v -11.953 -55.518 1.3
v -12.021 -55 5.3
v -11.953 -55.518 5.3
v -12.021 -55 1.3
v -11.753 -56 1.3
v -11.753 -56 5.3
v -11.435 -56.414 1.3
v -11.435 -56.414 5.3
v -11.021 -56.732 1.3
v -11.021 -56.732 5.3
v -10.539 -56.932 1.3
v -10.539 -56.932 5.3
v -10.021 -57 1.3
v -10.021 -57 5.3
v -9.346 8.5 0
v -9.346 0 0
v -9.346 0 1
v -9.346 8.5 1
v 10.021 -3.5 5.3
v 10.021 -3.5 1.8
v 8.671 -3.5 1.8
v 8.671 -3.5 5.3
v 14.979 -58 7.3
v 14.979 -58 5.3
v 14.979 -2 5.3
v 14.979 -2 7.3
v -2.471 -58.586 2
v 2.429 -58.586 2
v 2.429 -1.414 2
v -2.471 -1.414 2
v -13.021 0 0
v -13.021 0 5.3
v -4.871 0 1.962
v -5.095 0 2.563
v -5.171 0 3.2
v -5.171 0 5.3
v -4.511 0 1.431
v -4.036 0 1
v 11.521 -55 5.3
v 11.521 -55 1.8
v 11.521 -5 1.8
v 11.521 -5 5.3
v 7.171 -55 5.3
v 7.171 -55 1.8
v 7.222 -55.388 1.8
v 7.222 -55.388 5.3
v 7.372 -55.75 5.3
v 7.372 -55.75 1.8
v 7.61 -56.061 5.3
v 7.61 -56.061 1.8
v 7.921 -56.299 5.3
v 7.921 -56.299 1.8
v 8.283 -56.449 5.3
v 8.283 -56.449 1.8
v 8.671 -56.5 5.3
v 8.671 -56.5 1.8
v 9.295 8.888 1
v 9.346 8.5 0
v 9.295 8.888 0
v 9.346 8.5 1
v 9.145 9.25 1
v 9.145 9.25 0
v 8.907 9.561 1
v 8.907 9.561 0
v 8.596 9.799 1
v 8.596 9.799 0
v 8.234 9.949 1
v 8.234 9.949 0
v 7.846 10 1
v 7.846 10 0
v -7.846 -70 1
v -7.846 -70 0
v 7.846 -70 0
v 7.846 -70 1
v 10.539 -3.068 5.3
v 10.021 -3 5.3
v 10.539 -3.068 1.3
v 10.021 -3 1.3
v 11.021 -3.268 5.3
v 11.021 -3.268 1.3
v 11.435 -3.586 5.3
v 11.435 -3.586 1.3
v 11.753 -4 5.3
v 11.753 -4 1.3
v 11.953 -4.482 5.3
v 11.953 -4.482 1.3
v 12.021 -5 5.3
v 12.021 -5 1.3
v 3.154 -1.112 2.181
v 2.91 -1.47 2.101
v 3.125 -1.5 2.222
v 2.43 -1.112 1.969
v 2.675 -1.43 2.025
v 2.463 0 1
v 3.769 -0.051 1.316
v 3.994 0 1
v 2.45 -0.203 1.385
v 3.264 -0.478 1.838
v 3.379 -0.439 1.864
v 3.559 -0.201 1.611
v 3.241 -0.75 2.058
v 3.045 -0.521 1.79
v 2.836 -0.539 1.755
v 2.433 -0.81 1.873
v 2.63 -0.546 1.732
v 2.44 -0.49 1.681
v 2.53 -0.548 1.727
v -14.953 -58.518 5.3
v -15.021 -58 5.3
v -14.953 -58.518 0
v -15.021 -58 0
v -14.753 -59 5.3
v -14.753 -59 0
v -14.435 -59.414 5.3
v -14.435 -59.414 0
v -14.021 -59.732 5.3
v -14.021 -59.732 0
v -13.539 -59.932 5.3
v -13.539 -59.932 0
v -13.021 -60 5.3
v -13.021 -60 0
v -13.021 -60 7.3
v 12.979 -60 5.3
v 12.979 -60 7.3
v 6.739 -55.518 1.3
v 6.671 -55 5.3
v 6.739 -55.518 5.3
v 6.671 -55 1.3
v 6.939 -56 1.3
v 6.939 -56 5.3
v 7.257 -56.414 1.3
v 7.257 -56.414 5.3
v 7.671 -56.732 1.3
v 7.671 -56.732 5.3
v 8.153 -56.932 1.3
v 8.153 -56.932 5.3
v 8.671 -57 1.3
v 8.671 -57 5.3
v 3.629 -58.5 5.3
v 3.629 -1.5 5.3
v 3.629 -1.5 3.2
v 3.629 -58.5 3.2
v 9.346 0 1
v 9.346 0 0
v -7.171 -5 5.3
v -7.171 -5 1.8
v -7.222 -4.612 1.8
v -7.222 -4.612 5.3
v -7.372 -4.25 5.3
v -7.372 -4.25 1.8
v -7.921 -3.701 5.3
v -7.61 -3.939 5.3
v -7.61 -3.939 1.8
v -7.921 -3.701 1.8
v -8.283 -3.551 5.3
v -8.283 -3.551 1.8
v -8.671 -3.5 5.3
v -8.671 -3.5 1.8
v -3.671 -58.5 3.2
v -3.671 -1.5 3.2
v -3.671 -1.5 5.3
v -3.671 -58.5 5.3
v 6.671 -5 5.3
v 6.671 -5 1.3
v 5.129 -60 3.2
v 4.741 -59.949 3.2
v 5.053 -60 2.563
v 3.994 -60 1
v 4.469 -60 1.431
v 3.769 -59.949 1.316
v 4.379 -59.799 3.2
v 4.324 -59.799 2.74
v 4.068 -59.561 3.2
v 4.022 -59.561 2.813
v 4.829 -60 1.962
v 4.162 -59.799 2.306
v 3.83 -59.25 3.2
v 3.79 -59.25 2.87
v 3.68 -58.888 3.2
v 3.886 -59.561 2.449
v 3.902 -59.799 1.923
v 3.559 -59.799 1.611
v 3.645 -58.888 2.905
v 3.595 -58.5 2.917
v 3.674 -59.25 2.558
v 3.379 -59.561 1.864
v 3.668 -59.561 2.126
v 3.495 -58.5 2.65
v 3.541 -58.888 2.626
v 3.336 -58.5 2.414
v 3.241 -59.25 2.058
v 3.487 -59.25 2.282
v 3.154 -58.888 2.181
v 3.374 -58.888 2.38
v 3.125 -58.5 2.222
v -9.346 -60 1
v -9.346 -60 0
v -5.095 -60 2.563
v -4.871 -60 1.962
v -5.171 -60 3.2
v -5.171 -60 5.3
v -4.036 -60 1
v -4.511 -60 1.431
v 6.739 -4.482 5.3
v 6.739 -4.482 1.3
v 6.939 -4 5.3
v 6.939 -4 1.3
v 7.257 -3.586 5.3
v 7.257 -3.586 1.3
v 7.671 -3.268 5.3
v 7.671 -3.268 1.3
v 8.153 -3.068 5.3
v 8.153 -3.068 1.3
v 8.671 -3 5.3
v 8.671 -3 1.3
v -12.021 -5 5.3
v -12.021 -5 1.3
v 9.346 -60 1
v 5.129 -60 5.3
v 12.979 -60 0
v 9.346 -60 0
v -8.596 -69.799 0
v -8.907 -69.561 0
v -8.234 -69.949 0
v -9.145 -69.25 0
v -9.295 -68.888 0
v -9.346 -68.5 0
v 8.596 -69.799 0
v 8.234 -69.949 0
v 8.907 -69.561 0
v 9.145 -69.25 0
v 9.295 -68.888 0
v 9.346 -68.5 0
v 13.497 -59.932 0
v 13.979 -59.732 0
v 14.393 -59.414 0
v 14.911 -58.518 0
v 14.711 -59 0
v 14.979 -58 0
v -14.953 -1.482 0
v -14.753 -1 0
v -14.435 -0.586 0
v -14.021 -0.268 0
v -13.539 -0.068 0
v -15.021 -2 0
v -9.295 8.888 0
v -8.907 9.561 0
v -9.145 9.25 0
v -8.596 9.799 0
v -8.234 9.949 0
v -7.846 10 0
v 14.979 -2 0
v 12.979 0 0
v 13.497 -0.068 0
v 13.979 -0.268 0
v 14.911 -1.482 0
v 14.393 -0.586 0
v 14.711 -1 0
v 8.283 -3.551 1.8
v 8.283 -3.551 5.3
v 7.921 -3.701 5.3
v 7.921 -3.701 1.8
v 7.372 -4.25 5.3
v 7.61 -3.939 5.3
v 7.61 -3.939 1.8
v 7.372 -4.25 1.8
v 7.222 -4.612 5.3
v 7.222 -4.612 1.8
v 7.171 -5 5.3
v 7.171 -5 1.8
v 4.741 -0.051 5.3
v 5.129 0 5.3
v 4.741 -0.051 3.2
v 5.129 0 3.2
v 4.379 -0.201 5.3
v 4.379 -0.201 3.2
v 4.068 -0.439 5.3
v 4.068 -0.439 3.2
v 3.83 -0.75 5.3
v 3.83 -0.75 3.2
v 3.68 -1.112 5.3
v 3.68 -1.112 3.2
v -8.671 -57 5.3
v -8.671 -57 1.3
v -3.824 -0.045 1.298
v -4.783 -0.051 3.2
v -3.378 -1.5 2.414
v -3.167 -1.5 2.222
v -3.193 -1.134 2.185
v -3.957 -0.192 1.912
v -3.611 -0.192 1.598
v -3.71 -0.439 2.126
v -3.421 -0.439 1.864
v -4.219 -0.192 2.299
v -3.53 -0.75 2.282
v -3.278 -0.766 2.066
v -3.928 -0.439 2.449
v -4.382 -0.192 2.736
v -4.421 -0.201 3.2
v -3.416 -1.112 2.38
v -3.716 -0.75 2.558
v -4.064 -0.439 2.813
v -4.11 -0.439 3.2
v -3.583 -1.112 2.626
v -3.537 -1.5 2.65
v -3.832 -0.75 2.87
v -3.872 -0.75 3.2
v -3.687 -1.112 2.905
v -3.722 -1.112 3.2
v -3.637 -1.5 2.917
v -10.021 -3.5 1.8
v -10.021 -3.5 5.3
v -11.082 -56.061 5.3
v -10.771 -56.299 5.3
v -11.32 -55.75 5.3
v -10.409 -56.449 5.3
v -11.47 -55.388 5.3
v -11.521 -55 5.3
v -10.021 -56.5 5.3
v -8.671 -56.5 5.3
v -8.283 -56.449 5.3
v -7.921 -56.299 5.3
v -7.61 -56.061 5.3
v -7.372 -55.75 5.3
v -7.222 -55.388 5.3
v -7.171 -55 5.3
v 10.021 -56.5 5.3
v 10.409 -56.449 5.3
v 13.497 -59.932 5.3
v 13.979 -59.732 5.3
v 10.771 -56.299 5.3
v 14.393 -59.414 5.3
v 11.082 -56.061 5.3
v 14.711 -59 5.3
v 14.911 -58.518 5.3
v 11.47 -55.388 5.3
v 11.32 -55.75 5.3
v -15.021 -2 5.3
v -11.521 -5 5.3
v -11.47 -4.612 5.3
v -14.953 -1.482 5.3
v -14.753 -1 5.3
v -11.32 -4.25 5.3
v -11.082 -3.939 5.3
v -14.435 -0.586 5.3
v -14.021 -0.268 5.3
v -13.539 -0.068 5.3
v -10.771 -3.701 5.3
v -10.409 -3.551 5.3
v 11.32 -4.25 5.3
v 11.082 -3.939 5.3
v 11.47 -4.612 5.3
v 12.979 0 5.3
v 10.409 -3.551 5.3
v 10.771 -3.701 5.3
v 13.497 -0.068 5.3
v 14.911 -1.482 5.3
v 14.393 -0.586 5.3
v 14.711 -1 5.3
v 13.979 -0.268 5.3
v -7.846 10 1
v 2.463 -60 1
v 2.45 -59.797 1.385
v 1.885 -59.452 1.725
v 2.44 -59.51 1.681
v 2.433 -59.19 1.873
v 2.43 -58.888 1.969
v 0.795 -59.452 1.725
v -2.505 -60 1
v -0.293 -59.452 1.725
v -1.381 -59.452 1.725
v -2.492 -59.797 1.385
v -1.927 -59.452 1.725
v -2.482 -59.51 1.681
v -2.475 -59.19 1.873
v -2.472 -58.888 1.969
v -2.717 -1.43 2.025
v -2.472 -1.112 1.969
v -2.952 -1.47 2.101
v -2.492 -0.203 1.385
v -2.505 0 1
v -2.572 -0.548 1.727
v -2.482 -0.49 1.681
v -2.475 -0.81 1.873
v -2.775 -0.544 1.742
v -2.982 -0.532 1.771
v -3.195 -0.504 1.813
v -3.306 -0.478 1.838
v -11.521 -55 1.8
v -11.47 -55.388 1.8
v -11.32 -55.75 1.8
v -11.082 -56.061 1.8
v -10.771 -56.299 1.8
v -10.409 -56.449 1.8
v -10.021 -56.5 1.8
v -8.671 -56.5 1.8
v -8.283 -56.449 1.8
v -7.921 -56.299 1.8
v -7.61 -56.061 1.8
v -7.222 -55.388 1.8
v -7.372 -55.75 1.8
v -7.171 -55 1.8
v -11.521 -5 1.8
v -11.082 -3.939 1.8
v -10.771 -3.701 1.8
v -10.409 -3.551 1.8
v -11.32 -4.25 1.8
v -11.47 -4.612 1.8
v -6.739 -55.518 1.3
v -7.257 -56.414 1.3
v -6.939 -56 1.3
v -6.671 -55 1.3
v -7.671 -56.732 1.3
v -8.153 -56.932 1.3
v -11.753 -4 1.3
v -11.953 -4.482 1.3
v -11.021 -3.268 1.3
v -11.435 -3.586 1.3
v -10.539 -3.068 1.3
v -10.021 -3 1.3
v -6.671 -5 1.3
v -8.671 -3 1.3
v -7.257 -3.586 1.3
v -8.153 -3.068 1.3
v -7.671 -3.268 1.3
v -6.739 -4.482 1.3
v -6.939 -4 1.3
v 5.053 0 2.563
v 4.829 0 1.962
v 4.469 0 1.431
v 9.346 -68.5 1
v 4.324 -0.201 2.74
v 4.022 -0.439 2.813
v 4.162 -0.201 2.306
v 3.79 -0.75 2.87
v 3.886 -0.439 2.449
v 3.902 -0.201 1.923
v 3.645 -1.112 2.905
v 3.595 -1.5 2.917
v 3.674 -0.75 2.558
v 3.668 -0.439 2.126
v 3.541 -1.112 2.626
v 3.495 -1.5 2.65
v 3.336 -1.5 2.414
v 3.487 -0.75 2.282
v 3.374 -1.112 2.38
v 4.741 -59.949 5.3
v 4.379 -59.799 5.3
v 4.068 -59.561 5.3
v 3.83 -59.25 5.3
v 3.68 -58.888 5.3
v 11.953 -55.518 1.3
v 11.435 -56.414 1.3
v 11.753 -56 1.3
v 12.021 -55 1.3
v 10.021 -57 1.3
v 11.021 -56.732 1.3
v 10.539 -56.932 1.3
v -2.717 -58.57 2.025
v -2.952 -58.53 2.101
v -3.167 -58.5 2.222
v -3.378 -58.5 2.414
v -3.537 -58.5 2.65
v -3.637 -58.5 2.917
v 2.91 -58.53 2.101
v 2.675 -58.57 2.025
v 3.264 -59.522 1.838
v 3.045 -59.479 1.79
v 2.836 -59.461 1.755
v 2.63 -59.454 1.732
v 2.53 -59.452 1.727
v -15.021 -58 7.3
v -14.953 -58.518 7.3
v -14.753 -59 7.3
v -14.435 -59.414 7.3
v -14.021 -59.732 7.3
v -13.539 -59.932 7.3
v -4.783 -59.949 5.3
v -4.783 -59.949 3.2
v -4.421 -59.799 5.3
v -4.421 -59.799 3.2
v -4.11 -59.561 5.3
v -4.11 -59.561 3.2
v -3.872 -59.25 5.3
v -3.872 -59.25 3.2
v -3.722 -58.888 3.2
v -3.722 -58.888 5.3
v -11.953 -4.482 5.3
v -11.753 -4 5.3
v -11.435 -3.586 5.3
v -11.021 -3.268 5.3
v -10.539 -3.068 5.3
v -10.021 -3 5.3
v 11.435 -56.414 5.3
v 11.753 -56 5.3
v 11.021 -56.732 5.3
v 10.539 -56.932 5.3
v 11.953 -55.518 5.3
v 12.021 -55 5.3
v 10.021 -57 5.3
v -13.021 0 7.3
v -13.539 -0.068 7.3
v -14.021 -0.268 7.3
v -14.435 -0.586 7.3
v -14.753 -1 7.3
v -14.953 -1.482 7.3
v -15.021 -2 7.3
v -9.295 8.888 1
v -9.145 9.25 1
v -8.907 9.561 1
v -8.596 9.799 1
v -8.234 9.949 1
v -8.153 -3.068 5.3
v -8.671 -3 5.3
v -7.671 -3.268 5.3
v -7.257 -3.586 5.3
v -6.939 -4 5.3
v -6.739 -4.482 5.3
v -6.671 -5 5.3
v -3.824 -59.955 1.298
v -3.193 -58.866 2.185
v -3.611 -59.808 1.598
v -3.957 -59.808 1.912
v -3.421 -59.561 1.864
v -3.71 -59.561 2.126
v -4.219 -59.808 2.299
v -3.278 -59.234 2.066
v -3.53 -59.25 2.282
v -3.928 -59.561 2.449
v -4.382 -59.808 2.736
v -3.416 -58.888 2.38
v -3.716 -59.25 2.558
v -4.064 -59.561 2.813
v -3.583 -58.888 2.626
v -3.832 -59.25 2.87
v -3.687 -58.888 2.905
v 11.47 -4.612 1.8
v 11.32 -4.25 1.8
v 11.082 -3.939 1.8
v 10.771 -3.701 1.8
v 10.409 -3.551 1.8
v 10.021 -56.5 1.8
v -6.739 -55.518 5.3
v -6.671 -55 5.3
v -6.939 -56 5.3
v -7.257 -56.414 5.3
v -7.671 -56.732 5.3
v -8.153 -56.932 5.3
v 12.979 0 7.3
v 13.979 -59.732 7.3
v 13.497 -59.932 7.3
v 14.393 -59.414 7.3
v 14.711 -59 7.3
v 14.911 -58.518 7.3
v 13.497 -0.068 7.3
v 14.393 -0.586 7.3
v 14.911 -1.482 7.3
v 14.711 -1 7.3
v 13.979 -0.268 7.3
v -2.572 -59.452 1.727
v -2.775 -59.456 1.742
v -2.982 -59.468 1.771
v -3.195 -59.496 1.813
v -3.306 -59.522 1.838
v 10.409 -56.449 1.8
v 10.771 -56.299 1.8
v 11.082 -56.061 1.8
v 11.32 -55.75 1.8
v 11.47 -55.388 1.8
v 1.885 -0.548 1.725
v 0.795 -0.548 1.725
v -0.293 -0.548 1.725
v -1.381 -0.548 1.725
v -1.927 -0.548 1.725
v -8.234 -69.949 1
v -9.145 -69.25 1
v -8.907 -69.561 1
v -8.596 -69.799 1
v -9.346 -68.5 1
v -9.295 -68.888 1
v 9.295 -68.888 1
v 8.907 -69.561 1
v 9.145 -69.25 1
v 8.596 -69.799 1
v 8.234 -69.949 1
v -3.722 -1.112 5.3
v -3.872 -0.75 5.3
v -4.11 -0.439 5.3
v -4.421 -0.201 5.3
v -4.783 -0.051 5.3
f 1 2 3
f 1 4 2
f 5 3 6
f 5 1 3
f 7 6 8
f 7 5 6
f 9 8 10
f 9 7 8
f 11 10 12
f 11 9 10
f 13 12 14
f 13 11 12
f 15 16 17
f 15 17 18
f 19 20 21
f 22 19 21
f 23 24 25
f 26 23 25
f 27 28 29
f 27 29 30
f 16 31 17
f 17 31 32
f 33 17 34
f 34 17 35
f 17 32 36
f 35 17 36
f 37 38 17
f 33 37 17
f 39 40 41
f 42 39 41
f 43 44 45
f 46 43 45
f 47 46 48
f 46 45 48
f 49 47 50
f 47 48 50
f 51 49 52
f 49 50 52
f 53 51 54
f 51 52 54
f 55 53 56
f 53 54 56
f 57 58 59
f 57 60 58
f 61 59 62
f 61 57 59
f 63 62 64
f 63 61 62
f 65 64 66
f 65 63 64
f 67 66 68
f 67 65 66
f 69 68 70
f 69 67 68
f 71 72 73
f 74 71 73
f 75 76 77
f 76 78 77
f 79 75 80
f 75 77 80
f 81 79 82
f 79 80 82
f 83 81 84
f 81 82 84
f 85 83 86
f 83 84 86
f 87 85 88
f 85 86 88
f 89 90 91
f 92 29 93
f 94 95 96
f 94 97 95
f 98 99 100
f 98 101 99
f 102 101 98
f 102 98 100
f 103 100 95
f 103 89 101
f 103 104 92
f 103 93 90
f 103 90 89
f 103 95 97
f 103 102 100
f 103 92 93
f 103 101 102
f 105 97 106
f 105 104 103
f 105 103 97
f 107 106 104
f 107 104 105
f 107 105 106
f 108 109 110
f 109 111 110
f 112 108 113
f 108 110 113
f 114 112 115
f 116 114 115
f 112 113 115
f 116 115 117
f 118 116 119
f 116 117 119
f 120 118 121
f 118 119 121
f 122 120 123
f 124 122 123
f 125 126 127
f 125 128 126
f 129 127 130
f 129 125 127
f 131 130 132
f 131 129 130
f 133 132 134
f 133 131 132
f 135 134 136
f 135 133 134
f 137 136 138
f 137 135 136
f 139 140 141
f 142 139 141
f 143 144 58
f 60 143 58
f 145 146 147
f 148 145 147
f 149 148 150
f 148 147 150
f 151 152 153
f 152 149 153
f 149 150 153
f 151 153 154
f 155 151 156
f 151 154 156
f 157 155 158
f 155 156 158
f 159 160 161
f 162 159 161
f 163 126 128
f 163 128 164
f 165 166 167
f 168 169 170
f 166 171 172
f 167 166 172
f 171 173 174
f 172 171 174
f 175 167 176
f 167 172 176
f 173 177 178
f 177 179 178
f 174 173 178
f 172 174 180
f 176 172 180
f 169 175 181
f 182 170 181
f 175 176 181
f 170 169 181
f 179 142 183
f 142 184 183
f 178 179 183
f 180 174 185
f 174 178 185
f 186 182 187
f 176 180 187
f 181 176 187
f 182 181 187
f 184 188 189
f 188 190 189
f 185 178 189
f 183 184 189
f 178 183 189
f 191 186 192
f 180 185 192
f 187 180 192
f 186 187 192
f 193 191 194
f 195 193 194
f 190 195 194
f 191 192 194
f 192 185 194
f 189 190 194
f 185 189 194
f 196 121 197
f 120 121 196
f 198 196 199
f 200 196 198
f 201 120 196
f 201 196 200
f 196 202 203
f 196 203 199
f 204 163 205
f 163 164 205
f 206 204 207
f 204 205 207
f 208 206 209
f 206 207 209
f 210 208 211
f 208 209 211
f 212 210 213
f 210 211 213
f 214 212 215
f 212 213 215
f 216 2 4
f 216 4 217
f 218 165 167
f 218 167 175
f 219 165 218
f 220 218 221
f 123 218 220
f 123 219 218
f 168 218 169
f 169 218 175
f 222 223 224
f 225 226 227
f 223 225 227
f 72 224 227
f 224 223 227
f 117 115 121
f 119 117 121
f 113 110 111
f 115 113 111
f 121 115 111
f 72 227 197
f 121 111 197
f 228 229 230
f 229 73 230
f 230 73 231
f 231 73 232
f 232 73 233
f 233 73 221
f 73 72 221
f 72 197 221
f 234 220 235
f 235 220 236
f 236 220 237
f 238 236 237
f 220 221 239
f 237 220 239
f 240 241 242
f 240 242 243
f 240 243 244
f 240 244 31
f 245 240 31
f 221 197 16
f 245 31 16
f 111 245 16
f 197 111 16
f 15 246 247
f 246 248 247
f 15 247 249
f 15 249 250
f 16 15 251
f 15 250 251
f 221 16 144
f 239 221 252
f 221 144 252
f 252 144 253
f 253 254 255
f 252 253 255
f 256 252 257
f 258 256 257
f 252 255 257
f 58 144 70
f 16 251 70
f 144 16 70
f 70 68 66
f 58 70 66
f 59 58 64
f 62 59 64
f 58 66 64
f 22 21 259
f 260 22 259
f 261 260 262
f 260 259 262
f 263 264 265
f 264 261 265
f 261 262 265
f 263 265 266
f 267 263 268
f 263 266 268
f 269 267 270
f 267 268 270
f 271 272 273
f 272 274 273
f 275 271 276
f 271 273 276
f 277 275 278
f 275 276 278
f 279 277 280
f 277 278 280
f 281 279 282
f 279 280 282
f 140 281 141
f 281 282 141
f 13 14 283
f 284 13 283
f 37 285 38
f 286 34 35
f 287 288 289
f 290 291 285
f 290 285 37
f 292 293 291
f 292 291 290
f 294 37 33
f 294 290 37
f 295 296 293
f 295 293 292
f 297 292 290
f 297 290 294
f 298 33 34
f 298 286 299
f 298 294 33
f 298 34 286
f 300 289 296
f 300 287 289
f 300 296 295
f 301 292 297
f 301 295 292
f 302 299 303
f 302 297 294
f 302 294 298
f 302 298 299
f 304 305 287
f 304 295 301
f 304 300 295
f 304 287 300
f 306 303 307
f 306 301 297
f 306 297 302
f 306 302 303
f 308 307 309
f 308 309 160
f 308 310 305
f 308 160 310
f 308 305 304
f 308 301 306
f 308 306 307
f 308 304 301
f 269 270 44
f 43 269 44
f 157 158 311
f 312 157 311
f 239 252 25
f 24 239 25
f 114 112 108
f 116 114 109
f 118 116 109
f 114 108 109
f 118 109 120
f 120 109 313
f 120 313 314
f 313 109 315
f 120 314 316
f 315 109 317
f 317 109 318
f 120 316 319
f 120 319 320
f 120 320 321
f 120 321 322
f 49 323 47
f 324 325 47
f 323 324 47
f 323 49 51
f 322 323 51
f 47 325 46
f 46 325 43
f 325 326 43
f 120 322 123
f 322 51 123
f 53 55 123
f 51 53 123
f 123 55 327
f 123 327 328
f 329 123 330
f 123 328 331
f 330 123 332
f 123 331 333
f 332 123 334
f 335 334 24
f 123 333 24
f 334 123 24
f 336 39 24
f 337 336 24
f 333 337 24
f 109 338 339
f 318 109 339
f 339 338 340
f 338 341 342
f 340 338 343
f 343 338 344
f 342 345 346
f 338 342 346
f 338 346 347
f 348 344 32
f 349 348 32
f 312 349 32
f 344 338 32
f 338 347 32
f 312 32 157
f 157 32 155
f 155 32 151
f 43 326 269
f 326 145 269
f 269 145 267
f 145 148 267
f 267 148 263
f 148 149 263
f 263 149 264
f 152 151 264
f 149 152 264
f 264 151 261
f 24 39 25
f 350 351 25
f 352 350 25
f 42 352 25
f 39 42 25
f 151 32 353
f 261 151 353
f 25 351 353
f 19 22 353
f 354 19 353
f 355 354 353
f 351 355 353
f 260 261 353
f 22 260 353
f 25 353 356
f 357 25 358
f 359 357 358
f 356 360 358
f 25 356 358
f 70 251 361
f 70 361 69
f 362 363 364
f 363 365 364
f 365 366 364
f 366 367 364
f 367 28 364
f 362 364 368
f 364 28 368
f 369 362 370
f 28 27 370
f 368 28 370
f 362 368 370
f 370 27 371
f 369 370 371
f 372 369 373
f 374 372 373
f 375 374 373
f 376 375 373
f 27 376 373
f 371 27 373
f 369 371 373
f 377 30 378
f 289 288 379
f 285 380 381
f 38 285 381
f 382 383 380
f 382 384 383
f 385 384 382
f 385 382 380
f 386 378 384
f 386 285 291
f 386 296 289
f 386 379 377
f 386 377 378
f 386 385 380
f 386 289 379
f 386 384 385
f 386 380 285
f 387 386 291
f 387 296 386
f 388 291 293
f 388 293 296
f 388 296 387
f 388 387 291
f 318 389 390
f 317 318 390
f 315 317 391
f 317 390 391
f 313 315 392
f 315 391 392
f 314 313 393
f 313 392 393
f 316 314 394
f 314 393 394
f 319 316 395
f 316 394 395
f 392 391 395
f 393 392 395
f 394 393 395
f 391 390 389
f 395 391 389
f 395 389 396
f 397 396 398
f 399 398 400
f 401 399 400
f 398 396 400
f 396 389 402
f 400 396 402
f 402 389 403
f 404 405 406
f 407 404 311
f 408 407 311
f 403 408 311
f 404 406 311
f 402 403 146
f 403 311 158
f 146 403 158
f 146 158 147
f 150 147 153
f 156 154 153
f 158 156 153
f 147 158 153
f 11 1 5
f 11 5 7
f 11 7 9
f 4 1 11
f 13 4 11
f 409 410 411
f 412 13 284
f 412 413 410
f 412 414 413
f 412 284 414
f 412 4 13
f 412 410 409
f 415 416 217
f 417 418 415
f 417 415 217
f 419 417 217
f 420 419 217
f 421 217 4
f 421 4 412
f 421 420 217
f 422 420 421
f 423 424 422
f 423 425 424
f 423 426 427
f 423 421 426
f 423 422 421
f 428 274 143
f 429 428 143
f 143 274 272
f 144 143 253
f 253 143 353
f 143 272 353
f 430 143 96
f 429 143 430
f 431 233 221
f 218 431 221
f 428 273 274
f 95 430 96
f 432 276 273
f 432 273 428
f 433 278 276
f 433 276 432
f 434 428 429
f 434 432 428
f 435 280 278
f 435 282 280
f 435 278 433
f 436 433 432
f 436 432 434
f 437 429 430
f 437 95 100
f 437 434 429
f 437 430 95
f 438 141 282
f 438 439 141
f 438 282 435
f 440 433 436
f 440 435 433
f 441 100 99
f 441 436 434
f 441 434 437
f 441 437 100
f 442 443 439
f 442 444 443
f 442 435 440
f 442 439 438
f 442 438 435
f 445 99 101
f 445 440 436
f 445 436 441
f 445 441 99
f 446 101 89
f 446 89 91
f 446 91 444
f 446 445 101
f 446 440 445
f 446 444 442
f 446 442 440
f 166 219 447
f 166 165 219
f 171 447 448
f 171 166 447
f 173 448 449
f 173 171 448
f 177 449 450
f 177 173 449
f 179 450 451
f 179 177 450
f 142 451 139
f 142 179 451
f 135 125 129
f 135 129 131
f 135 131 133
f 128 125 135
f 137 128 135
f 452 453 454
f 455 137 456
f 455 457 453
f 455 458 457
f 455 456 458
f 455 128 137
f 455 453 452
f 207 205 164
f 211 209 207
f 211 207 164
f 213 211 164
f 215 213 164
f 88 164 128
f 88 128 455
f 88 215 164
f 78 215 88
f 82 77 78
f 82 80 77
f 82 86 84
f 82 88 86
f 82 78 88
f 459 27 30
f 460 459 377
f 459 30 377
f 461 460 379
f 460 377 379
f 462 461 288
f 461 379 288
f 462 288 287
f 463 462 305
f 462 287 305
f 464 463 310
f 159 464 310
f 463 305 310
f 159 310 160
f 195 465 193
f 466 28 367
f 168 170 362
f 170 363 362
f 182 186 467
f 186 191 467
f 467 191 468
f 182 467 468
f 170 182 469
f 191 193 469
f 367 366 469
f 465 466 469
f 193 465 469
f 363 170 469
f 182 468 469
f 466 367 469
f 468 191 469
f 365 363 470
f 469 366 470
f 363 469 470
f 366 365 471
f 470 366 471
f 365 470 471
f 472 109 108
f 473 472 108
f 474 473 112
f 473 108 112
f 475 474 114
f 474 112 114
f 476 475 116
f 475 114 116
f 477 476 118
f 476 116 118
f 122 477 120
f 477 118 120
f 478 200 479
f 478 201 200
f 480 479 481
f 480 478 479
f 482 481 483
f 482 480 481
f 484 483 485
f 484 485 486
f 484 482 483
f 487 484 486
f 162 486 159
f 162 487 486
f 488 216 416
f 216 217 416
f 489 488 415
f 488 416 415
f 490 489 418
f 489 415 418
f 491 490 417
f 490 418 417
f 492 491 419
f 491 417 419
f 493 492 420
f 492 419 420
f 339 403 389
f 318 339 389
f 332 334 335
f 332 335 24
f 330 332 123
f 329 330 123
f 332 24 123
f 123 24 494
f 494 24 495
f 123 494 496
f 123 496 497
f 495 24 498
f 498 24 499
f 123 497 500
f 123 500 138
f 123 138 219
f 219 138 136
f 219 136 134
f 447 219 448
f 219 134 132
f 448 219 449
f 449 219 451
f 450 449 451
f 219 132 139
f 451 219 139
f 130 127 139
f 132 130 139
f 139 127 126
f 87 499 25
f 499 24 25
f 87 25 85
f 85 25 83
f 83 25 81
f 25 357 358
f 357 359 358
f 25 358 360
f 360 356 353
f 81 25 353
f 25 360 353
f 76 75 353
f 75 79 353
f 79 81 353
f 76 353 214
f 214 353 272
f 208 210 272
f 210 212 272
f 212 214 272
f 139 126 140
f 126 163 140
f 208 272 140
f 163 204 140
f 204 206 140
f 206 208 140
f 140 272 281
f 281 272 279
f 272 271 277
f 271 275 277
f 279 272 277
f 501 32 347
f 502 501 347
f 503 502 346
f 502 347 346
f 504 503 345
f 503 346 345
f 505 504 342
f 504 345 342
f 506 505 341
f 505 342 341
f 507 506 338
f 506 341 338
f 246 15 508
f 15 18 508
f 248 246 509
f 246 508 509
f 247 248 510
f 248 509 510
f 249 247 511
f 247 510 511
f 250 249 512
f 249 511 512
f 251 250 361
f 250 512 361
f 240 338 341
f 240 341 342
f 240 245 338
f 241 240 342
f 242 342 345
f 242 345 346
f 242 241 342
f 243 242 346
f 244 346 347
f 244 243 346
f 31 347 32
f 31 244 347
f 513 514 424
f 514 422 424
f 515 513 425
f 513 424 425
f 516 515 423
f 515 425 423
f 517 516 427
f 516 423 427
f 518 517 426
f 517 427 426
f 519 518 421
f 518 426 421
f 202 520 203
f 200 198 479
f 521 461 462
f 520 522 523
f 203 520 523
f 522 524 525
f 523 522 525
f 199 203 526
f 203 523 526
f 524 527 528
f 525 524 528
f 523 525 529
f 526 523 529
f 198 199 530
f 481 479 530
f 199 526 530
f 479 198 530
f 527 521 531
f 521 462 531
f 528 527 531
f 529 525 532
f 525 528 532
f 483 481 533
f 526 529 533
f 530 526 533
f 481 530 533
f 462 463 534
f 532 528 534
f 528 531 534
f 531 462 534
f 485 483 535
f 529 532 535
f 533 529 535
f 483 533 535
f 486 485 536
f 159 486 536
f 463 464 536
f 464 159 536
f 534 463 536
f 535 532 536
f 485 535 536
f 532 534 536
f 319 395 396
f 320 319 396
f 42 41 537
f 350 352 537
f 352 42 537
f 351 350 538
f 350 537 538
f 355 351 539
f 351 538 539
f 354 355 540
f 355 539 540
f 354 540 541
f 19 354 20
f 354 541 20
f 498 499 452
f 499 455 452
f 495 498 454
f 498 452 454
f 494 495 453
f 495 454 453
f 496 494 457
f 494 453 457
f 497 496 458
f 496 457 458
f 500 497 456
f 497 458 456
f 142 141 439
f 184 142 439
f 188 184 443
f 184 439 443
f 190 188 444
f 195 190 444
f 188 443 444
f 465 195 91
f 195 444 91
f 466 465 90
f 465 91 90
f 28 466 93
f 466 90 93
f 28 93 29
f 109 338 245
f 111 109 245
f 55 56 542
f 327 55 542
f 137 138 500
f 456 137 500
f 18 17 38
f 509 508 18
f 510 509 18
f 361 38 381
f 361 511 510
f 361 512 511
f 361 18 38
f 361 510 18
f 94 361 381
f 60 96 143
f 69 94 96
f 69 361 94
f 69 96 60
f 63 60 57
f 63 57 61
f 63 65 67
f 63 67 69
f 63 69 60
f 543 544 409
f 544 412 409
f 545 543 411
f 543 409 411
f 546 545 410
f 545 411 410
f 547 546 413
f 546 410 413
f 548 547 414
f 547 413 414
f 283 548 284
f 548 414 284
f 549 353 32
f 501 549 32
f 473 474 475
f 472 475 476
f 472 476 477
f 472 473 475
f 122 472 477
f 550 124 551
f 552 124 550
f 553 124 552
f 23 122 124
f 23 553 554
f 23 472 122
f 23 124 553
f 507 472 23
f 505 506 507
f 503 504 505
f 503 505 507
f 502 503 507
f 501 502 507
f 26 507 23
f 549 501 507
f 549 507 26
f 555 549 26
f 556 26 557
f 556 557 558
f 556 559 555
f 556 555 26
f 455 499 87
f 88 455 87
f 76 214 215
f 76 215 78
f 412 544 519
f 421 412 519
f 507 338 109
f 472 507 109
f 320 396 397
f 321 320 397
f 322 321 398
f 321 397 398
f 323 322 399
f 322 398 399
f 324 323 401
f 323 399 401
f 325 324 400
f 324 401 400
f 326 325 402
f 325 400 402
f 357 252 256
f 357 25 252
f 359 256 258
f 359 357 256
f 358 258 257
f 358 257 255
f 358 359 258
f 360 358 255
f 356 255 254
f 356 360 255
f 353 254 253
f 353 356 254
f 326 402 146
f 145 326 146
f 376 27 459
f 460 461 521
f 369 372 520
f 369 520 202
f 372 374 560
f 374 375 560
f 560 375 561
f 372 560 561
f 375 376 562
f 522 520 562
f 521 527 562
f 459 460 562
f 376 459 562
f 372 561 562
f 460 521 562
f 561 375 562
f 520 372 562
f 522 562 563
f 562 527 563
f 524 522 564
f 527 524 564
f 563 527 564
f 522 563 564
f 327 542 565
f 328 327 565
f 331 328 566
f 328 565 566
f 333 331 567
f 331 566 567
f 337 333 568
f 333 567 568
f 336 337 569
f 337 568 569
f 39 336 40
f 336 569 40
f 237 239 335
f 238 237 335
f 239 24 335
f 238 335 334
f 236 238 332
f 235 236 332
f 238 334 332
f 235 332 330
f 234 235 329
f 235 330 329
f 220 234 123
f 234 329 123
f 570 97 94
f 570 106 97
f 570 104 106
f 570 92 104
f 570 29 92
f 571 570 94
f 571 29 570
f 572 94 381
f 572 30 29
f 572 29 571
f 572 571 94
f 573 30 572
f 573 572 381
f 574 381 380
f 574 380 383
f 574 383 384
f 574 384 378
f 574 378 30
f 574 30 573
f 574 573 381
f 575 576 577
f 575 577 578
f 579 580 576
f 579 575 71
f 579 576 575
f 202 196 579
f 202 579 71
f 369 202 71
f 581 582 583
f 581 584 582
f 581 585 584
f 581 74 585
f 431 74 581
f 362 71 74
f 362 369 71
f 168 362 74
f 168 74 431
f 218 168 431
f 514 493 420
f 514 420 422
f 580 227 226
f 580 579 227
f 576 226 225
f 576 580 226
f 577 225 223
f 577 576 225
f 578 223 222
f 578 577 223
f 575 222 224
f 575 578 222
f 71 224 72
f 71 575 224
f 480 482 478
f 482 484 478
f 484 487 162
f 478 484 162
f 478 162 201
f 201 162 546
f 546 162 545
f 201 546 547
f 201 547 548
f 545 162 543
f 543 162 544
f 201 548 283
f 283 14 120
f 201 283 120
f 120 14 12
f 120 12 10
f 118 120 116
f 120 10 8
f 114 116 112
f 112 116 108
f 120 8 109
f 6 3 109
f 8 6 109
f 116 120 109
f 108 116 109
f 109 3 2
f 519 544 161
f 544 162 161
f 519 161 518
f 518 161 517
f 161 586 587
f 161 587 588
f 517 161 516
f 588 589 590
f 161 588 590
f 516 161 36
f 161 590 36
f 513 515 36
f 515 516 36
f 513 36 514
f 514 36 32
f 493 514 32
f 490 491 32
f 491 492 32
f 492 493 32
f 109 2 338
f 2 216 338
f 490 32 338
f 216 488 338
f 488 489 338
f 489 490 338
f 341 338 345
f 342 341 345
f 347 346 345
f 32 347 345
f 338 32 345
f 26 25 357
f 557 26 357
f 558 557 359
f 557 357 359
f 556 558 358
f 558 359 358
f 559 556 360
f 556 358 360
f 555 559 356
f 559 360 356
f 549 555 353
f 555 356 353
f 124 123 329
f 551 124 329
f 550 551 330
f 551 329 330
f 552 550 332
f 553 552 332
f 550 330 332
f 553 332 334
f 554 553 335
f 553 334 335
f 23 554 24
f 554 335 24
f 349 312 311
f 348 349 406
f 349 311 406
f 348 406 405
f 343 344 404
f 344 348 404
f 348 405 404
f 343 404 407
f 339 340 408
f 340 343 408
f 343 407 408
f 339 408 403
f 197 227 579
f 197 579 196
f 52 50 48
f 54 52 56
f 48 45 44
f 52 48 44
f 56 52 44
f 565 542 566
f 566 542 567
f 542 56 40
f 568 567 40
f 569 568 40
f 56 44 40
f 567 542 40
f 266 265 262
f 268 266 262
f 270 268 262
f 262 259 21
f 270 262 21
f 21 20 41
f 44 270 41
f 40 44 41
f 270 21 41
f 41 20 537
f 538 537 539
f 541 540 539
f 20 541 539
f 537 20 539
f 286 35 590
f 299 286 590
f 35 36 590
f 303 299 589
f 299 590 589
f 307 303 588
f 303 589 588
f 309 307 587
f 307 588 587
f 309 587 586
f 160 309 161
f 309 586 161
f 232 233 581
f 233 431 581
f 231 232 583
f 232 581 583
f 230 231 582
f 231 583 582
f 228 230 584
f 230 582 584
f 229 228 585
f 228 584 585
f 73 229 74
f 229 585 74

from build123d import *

# Parameters (mm, degrees)
F1_DEPTH      = 60
F2_W          = 5.35
F2_H          = 54
F3_DEPTH      = 4
F4_R          = 2
F5_W          = 18.692020604
F5_H          = 10
F6_DEPTH      = 1
F7_R          = 1.5
F9_DEPTH      = 3.5
F9_DEPTH_BACK = 2
F10_DEPTH     = 2


with BuildPart() as f1:
    # F0 (on Front) → F1 (new body)
    with BuildSketch(Plane.XZ):
        with BuildLine():
            Line((-15.021010302, 0), (0, 0))
            Line((0, 0), (14.978989698, 0))
            Line((14.978989698, 0), (14.978989698, 5.3))
            Line((14.978989698, 5.3), (3.628989698, 5.3))
            Line((3.628989698, 5.3), (3.628989698, 3.2))
            ThreePointArc((3.628989698, 3.2), (3.2775178354, 2.3514718626), (2.428989698, 2))
            Line((2.428989698, 2), (0.203989698, 2))
            Line((0.203989698, 2), (-0.246010302, 2))
            Line((-0.246010302, 2), (-2.471010302, 2))
            ThreePointArc((-2.471010302, 2), (-3.3195384394, 2.3514718626), (-3.671010302, 3.2))
            Line((-3.671010302, 3.2), (-3.671010302, 5.3))
            Line((-3.671010302, 5.3), (-15.021010302, 5.3))
            Line((-15.021010302, 5.3), (-15.021010302, 0))
        make_face()
    extrude(amount=F1_DEPTH)

    # F2 (on face) → F3 (cut)
    with BuildSketch(Plane.XY.offset(5.3)):
        with Locations((-9.346010302, -30)):
            Rectangle(F2_W, F2_H)
        with Locations((9.346010302, -30)):
            Rectangle(F2_W, F2_H)
    extrude(amount=-F3_DEPTH, mode=Mode.SUBTRACT)

    # F4
    f4_edges = [f1.edges().sort_by_distance(p)[0] for p in [
        (-6.67101, -3, 3.3),
        (-12.02101, -3, 3.3),
        (-12.02101, -57, 3.3),
        (-6.67101, -57, 3.3),
        (6.67101, -3, 3.3),
        (12.02101, -3, 3.3),
        (6.67101, -57, 3.3),
        (12.02101, -57, 3.3),
        (-15.02101, 0, 2.65),
        (14.97899, 0, 2.65),
        (14.97899, -60, 2.65),
        (-15.02101, -60, 2.65),
    ]]
    fillet(f4_edges, radius=F4_R)

    # F5 (on Top) → F6 (join)
    with BuildSketch(Plane.XY):
        with Locations((0, 5)):
            Rectangle(F5_W, F5_H)
        with Locations((0, -65)):
            Rectangle(F5_W, F5_H)
    extrude(amount=F6_DEPTH)

    # F7
    f7_edges = [f1.edges().sort_by_distance(p)[0] for p in [
        (-9.34601, -70, 0.5),
        (9.34601, -70, 0.5),
        (-0.02101, -60, 2),
        (-0.02101, 0, 2),
        (-9.34601, 10, 0.5),
        (9.34601, 10, 0.5),
    ]]
    fillet(f7_edges, radius=F7_R)


with BuildPart() as f9:
    # F8 (on face) → F9 (new body, two sides)
    with BuildSketch(Plane.XY.offset(5.3)) as f9_sk:
        with BuildLine():
            Line((11.521010302, -55), (11.521010302, -5))
            ThreePointArc((11.521010302, -5), (11.0816704738, -3.9393398282), (10.021010302, -3.5))
            Line((10.021010302, -3.5), (8.671010302, -3.5))
            ThreePointArc((8.671010302, -3.5), (7.6103501302, -3.9393398282), (7.171010302, -5))
            Line((7.171010302, -5), (7.171010302, -55))
            ThreePointArc((7.171010302, -55), (7.6103501302, -56.0606601718), (8.671010302, -56.5))
            Line((8.671010302, -56.5), (10.021010302, -56.5))
            ThreePointArc((10.021010302, -56.5), (11.0816704738, -56.0606601718), (11.521010302, -55))
        make_face()
    extrude(amount=-F9_DEPTH)
    extrude(f9_sk.sketch, amount=F9_DEPTH_BACK)



with BuildPart() as f9b:
    # F8 (on face) → F9, piece 2 (new body, two sides)
    with BuildSketch(Plane.XY.offset(5.3)) as f9_2_sk:
        with BuildLine():
            ThreePointArc((-7.171010302, -5), (-7.6103501302, -3.9393398282), (-8.671010302, -3.5))
            Line((-8.671010302, -3.5), (-10.021010302, -3.5))
            ThreePointArc((-10.021010302, -3.5), (-11.0816704738, -3.9393398282), (-11.521010302, -5))
            Line((-11.521010302, -5), (-11.521010302, -55))
            ThreePointArc((-11.521010302, -55), (-11.0816704738, -56.0606601718), (-10.021010302, -56.5))
            Line((-10.021010302, -56.5), (-8.671010302, -56.5))
            ThreePointArc((-8.671010302, -56.5), (-7.6103501302, -56.0606601718), (-7.171010302, -55))
            Line((-7.171010302, -55), (-7.171010302, -5))
        make_face()
    extrude(amount=-F9_DEPTH)
    extrude(f9_2_sk.sketch, amount=F9_DEPTH_BACK)


with BuildPart() as f9_1:
    add(f9.part)

    add(f9b.part)  # F10 merges F9b
    # F8 (on face) → F10 (join)
    with BuildSketch(Plane.XY.offset(5.3)):
        with BuildLine():
            Line((-15.021010302, -2), (-15.021010302, -58))
            ThreePointArc((-15.021010302, -58), (-14.4352238644, -59.4142135624), (-13.021010302, -60))
            Line((-13.021010302, -60), (-5.171010302, -60))
            ThreePointArc((-5.171010302, -60), (-4.1103501302, -59.5606601718), (-3.671010302, -58.5))
            Line((-3.671010302, -58.5), (-3.671010302, -1.5))
            ThreePointArc((-3.671010302, -1.5), (-4.1103501302, -0.4393398282), (-5.171010302, 0))
            Line((-5.171010302, 0), (-13.021010302, 0))
            ThreePointArc((-13.021010302, 0), (-14.4352238644, -0.5857864376), (-15.021010302, -2))
        make_face()
        with BuildLine():
            Line((-12.021010302, -55), (-12.021010302, -5))
            ThreePointArc((-12.021010302, -5), (-11.4352238644, -3.5857864376), (-10.021010302, -3))
            Line((-10.021010302, -3), (-8.671010302, -3))
            ThreePointArc((-8.671010302, -3), (-7.2567967396, -3.5857864376), (-6.671010302, -5))
            Line((-6.671010302, -5), (-6.671010302, -55))
            ThreePointArc((-6.671010302, -55), (-7.2567967396, -56.4142135624), (-8.671010302, -57))
            Line((-8.671010302, -57), (-10.021010302, -57))
            ThreePointArc((-10.021010302, -57), (-11.4352238644, -56.4142135624), (-12.021010302, -55))
        make_face(mode=Mode.SUBTRACT)
        with BuildLine():
            ThreePointArc((-3.671010302, -58.5), (-4.1103501302, -59.5606601718), (-5.171010302, -60))
            Line((-5.171010302, -60), (5.128989698, -60))
            Line((5.128989698, -60), (12.978989698, -60))
            ThreePointArc((12.978989698, -60), (14.3932032604, -59.4142135624), (14.978989698, -58))
            Line((14.978989698, -58), (14.978989698, -2))
            ThreePointArc((14.978989698, -2), (14.3932032604, -0.5857864376), (12.978989698, 0))
            Line((12.978989698, 0), (5.128989698, 0))
            Line((5.128989698, 0), (-5.171010302, 0))
            ThreePointArc((-5.171010302, 0), (-4.1103501302, -0.4393398282), (-3.671010302, -1.5))
            Line((-3.671010302, -1.5), (-3.671010302, -58.5))
        make_face()
        with BuildLine():
            ThreePointArc((10.021010302, -3.5), (11.0816704738, -3.9393398282), (11.521010302, -5))
            Line((11.521010302, -5), (11.521010302, -55))
            ThreePointArc((11.521010302, -55), (11.0816704738, -56.0606601718), (10.021010302, -56.5))
            Line((10.021010302, -56.5), (8.671010302, -56.5))
            ThreePointArc((8.671010302, -56.5), (7.6103501302, -56.0606601718), (7.171010302, -55))
            Line((7.171010302, -55), (7.171010302, -5))
            ThreePointArc((7.171010302, -5), (7.6103501302, -3.9393398282), (8.671010302, -3.5))
            Line((8.671010302, -3.5), (10.021010302, -3.5))
        make_face(mode=Mode.SUBTRACT)
        with BuildLine():
            ThreePointArc((-10.021010302, -3), (-11.4352238644, -3.5857864376), (-12.021010302, -5))
            Line((-12.021010302, -5), (-12.021010302, -55))
            ThreePointArc((-12.021010302, -55), (-11.4352238644, -56.4142135624), (-10.021010302, -57))
            Line((-10.021010302, -57), (-8.671010302, -57))
            ThreePointArc((-8.671010302, -57), (-7.2567967396, -56.4142135624), (-6.671010302, -55))
            Line((-6.671010302, -55), (-6.671010302, -5))
            ThreePointArc((-6.671010302, -5), (-7.2567967396, -3.5857864376), (-8.671010302, -3))
            Line((-8.671010302, -3), (-10.021010302, -3))
        make_face()
        with BuildLine():
            Line((-10.021010302, -3.5), (-8.671010302, -3.5))
            ThreePointArc((-8.671010302, -3.5), (-7.6103501302, -3.9393398282), (-7.171010302, -5))
            Line((-7.171010302, -5), (-7.171010302, -55))
            ThreePointArc((-7.171010302, -55), (-7.6103501302, -56.0606601718), (-8.671010302, -56.5))
            Line((-8.671010302, -56.5), (-10.021010302, -56.5))
            ThreePointArc((-10.021010302, -56.5), (-11.0816704738, -56.0606601718), (-11.521010302, -55))
            Line((-11.521010302, -55), (-11.521010302, -5))
            ThreePointArc((-11.521010302, -5), (-11.0816704738, -3.9393398282), (-10.021010302, -3.5))
        make_face(mode=Mode.SUBTRACT)
    extrude(amount=F10_DEPTH)


solid = Compound([f1.part, f9_1.part])
